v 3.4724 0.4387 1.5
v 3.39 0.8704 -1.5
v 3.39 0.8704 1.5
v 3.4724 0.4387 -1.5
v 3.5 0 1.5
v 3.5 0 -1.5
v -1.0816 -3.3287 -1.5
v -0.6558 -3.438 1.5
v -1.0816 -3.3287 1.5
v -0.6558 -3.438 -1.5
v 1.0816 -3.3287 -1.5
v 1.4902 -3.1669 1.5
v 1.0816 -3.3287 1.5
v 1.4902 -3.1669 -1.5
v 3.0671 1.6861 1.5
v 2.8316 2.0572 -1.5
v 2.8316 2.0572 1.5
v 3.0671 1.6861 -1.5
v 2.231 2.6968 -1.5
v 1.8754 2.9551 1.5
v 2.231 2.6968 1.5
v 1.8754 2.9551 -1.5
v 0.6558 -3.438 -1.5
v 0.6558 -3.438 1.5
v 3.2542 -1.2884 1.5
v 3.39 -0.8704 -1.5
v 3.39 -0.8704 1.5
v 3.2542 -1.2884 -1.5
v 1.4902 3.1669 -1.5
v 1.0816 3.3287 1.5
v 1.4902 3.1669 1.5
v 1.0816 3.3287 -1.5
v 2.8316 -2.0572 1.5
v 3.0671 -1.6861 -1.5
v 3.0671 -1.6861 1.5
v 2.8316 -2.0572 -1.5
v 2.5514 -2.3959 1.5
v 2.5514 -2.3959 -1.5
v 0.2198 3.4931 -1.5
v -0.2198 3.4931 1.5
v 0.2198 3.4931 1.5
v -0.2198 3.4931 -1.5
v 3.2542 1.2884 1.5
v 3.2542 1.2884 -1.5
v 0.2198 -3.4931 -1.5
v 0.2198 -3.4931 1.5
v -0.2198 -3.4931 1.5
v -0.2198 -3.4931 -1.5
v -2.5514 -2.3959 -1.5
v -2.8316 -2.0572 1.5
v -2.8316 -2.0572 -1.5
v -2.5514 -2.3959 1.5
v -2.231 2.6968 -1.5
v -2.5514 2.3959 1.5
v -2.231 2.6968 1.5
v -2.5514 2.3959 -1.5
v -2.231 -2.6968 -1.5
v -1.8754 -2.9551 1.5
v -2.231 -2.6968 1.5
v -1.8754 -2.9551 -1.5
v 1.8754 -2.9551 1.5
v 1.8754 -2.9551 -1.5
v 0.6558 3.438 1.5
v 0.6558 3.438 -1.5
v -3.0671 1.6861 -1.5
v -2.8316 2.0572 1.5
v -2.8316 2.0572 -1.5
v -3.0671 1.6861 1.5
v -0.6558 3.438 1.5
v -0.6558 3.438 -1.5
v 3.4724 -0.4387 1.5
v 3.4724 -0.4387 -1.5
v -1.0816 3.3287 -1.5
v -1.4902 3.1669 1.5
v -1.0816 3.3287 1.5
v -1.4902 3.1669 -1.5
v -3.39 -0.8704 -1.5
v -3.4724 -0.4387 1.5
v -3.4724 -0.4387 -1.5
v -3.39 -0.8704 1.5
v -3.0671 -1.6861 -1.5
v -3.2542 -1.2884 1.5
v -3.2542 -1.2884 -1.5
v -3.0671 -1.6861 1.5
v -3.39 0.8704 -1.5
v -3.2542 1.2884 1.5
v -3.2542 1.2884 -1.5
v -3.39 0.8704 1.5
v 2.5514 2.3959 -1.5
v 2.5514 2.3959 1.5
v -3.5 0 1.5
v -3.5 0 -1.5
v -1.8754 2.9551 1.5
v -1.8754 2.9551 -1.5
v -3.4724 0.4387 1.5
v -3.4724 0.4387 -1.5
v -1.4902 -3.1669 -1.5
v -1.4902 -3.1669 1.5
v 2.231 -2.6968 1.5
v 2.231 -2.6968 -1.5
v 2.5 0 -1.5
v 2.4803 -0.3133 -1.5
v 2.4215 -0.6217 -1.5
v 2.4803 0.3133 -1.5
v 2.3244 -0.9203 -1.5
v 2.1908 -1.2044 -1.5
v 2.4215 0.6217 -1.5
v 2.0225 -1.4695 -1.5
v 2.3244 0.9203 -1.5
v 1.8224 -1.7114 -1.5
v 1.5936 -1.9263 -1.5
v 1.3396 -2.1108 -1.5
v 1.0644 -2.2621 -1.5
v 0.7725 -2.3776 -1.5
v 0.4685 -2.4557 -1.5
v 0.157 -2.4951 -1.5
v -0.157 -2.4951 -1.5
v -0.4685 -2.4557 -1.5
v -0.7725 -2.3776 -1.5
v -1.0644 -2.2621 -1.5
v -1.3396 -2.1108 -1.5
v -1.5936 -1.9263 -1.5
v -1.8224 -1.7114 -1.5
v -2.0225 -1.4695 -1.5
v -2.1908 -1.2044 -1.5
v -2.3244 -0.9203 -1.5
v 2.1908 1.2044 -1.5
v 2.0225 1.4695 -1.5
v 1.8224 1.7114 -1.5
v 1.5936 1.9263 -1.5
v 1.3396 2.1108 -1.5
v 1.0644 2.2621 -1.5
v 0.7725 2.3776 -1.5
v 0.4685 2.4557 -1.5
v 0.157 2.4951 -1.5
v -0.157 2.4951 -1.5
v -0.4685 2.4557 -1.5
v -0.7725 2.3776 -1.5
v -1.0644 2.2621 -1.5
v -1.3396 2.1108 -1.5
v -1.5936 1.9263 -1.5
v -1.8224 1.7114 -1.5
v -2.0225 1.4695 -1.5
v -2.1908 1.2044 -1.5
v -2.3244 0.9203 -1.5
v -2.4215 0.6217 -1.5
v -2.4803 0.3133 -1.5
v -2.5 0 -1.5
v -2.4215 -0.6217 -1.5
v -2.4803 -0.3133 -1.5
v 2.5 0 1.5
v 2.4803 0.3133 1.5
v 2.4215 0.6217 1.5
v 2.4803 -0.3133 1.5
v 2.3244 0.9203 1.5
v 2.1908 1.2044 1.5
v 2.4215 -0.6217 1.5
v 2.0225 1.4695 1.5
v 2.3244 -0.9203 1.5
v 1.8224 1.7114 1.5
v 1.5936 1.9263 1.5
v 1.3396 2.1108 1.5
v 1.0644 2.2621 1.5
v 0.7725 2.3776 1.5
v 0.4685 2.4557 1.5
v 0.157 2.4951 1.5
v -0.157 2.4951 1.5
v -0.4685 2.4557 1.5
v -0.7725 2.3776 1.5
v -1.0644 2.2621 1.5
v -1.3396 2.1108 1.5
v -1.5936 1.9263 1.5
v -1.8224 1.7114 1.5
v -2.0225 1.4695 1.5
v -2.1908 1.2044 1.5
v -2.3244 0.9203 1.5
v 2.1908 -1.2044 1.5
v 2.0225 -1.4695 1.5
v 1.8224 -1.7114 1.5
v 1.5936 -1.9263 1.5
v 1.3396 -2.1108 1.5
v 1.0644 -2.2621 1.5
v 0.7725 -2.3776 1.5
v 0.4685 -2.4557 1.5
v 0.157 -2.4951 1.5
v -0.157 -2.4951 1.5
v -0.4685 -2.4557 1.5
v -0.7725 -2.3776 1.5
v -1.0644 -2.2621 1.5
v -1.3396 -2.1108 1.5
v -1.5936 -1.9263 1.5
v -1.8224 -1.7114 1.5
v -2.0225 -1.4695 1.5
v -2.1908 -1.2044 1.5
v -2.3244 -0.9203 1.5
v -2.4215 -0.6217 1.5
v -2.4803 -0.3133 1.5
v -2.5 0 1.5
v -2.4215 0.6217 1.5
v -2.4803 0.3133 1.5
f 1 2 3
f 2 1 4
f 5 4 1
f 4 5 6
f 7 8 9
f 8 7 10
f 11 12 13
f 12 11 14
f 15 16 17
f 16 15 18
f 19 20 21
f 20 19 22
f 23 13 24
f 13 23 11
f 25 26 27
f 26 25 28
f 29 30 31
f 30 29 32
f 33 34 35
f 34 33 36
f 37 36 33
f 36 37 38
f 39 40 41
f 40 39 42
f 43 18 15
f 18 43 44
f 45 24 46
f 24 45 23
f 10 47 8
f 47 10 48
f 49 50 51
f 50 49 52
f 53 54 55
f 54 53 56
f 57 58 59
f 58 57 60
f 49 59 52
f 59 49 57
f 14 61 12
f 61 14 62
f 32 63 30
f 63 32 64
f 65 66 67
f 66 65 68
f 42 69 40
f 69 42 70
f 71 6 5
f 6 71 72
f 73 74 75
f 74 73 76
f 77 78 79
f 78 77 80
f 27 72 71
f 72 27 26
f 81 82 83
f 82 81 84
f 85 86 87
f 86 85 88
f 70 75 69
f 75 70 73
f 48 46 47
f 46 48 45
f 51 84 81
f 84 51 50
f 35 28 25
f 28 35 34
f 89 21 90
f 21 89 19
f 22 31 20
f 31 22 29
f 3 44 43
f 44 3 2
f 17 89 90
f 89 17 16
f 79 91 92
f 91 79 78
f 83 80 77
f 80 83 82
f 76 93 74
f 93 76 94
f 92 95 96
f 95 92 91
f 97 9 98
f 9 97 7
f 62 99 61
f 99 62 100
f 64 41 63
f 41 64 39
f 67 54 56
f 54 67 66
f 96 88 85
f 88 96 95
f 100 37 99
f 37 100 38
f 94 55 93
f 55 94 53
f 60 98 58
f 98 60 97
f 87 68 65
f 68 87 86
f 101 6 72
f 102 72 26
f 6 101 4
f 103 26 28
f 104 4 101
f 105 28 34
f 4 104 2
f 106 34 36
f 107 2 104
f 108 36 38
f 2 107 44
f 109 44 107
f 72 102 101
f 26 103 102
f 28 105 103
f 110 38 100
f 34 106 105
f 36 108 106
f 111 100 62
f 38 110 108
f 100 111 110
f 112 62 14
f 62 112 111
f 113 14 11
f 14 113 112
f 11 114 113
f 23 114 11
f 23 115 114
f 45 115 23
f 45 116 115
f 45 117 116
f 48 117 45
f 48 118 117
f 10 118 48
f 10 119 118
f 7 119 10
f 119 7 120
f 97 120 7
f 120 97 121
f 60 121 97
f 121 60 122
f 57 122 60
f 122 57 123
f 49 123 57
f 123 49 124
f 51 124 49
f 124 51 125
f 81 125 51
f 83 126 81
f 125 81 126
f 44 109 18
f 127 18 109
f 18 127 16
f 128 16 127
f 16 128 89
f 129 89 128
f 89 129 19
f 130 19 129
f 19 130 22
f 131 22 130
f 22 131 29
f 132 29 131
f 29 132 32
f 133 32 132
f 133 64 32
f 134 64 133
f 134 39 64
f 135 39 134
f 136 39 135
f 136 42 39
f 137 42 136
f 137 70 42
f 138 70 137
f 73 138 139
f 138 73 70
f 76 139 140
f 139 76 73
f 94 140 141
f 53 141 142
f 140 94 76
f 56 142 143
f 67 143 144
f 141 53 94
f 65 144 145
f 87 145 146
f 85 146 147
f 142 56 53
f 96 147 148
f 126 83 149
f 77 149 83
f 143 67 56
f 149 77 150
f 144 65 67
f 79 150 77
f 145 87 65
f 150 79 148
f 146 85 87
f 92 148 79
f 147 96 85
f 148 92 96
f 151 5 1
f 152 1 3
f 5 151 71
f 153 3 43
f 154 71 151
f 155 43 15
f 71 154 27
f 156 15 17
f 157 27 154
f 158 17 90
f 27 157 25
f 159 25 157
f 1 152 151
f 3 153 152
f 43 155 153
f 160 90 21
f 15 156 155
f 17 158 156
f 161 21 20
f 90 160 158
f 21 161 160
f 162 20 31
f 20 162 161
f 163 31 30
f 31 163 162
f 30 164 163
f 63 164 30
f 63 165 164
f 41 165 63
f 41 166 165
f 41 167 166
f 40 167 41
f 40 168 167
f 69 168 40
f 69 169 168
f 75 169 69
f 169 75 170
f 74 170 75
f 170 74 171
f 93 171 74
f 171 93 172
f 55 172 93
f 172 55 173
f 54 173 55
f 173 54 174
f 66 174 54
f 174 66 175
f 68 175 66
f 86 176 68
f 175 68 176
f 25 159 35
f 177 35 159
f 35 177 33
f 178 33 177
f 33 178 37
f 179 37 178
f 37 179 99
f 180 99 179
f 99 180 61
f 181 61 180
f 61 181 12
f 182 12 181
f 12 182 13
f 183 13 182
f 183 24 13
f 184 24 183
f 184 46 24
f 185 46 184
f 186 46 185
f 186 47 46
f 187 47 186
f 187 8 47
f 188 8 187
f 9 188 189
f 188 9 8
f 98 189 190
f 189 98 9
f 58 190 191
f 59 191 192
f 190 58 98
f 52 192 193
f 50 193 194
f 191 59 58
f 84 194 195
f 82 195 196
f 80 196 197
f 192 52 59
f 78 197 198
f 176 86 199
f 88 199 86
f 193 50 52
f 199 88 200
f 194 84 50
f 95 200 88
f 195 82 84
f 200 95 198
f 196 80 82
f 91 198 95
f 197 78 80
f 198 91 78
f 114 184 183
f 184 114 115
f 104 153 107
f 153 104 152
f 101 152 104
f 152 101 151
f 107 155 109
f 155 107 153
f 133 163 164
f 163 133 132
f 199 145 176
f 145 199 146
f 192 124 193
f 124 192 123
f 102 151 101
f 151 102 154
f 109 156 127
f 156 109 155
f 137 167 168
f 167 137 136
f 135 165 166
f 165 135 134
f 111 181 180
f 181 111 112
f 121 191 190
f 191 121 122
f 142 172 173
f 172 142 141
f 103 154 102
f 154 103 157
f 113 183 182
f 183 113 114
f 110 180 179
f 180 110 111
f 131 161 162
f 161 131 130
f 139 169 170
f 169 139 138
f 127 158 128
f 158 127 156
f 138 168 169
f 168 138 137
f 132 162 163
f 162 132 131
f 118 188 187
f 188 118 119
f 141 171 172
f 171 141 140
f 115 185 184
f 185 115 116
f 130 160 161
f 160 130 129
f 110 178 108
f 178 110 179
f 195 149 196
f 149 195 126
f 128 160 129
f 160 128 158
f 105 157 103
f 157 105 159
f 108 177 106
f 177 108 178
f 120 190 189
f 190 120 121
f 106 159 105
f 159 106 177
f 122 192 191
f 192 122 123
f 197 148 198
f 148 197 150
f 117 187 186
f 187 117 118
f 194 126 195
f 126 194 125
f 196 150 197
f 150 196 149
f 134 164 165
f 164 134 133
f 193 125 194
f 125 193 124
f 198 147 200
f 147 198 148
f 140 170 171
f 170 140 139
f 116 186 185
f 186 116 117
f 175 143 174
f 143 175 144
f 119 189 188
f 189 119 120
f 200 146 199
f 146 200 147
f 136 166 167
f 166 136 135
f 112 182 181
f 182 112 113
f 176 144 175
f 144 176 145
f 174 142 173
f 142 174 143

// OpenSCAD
$fn = 50;


difference() {
	union() {
		translate(v = [0, 0, -1.5000000000]) {
			cylinder(h = 3, r = 3.5000000000);
		}
	}
	union() {
		translate(v = [0, 0, -100.0000000000]) {
			cylinder(h = 200, r = 2.5000000000);
		}
	}
}
